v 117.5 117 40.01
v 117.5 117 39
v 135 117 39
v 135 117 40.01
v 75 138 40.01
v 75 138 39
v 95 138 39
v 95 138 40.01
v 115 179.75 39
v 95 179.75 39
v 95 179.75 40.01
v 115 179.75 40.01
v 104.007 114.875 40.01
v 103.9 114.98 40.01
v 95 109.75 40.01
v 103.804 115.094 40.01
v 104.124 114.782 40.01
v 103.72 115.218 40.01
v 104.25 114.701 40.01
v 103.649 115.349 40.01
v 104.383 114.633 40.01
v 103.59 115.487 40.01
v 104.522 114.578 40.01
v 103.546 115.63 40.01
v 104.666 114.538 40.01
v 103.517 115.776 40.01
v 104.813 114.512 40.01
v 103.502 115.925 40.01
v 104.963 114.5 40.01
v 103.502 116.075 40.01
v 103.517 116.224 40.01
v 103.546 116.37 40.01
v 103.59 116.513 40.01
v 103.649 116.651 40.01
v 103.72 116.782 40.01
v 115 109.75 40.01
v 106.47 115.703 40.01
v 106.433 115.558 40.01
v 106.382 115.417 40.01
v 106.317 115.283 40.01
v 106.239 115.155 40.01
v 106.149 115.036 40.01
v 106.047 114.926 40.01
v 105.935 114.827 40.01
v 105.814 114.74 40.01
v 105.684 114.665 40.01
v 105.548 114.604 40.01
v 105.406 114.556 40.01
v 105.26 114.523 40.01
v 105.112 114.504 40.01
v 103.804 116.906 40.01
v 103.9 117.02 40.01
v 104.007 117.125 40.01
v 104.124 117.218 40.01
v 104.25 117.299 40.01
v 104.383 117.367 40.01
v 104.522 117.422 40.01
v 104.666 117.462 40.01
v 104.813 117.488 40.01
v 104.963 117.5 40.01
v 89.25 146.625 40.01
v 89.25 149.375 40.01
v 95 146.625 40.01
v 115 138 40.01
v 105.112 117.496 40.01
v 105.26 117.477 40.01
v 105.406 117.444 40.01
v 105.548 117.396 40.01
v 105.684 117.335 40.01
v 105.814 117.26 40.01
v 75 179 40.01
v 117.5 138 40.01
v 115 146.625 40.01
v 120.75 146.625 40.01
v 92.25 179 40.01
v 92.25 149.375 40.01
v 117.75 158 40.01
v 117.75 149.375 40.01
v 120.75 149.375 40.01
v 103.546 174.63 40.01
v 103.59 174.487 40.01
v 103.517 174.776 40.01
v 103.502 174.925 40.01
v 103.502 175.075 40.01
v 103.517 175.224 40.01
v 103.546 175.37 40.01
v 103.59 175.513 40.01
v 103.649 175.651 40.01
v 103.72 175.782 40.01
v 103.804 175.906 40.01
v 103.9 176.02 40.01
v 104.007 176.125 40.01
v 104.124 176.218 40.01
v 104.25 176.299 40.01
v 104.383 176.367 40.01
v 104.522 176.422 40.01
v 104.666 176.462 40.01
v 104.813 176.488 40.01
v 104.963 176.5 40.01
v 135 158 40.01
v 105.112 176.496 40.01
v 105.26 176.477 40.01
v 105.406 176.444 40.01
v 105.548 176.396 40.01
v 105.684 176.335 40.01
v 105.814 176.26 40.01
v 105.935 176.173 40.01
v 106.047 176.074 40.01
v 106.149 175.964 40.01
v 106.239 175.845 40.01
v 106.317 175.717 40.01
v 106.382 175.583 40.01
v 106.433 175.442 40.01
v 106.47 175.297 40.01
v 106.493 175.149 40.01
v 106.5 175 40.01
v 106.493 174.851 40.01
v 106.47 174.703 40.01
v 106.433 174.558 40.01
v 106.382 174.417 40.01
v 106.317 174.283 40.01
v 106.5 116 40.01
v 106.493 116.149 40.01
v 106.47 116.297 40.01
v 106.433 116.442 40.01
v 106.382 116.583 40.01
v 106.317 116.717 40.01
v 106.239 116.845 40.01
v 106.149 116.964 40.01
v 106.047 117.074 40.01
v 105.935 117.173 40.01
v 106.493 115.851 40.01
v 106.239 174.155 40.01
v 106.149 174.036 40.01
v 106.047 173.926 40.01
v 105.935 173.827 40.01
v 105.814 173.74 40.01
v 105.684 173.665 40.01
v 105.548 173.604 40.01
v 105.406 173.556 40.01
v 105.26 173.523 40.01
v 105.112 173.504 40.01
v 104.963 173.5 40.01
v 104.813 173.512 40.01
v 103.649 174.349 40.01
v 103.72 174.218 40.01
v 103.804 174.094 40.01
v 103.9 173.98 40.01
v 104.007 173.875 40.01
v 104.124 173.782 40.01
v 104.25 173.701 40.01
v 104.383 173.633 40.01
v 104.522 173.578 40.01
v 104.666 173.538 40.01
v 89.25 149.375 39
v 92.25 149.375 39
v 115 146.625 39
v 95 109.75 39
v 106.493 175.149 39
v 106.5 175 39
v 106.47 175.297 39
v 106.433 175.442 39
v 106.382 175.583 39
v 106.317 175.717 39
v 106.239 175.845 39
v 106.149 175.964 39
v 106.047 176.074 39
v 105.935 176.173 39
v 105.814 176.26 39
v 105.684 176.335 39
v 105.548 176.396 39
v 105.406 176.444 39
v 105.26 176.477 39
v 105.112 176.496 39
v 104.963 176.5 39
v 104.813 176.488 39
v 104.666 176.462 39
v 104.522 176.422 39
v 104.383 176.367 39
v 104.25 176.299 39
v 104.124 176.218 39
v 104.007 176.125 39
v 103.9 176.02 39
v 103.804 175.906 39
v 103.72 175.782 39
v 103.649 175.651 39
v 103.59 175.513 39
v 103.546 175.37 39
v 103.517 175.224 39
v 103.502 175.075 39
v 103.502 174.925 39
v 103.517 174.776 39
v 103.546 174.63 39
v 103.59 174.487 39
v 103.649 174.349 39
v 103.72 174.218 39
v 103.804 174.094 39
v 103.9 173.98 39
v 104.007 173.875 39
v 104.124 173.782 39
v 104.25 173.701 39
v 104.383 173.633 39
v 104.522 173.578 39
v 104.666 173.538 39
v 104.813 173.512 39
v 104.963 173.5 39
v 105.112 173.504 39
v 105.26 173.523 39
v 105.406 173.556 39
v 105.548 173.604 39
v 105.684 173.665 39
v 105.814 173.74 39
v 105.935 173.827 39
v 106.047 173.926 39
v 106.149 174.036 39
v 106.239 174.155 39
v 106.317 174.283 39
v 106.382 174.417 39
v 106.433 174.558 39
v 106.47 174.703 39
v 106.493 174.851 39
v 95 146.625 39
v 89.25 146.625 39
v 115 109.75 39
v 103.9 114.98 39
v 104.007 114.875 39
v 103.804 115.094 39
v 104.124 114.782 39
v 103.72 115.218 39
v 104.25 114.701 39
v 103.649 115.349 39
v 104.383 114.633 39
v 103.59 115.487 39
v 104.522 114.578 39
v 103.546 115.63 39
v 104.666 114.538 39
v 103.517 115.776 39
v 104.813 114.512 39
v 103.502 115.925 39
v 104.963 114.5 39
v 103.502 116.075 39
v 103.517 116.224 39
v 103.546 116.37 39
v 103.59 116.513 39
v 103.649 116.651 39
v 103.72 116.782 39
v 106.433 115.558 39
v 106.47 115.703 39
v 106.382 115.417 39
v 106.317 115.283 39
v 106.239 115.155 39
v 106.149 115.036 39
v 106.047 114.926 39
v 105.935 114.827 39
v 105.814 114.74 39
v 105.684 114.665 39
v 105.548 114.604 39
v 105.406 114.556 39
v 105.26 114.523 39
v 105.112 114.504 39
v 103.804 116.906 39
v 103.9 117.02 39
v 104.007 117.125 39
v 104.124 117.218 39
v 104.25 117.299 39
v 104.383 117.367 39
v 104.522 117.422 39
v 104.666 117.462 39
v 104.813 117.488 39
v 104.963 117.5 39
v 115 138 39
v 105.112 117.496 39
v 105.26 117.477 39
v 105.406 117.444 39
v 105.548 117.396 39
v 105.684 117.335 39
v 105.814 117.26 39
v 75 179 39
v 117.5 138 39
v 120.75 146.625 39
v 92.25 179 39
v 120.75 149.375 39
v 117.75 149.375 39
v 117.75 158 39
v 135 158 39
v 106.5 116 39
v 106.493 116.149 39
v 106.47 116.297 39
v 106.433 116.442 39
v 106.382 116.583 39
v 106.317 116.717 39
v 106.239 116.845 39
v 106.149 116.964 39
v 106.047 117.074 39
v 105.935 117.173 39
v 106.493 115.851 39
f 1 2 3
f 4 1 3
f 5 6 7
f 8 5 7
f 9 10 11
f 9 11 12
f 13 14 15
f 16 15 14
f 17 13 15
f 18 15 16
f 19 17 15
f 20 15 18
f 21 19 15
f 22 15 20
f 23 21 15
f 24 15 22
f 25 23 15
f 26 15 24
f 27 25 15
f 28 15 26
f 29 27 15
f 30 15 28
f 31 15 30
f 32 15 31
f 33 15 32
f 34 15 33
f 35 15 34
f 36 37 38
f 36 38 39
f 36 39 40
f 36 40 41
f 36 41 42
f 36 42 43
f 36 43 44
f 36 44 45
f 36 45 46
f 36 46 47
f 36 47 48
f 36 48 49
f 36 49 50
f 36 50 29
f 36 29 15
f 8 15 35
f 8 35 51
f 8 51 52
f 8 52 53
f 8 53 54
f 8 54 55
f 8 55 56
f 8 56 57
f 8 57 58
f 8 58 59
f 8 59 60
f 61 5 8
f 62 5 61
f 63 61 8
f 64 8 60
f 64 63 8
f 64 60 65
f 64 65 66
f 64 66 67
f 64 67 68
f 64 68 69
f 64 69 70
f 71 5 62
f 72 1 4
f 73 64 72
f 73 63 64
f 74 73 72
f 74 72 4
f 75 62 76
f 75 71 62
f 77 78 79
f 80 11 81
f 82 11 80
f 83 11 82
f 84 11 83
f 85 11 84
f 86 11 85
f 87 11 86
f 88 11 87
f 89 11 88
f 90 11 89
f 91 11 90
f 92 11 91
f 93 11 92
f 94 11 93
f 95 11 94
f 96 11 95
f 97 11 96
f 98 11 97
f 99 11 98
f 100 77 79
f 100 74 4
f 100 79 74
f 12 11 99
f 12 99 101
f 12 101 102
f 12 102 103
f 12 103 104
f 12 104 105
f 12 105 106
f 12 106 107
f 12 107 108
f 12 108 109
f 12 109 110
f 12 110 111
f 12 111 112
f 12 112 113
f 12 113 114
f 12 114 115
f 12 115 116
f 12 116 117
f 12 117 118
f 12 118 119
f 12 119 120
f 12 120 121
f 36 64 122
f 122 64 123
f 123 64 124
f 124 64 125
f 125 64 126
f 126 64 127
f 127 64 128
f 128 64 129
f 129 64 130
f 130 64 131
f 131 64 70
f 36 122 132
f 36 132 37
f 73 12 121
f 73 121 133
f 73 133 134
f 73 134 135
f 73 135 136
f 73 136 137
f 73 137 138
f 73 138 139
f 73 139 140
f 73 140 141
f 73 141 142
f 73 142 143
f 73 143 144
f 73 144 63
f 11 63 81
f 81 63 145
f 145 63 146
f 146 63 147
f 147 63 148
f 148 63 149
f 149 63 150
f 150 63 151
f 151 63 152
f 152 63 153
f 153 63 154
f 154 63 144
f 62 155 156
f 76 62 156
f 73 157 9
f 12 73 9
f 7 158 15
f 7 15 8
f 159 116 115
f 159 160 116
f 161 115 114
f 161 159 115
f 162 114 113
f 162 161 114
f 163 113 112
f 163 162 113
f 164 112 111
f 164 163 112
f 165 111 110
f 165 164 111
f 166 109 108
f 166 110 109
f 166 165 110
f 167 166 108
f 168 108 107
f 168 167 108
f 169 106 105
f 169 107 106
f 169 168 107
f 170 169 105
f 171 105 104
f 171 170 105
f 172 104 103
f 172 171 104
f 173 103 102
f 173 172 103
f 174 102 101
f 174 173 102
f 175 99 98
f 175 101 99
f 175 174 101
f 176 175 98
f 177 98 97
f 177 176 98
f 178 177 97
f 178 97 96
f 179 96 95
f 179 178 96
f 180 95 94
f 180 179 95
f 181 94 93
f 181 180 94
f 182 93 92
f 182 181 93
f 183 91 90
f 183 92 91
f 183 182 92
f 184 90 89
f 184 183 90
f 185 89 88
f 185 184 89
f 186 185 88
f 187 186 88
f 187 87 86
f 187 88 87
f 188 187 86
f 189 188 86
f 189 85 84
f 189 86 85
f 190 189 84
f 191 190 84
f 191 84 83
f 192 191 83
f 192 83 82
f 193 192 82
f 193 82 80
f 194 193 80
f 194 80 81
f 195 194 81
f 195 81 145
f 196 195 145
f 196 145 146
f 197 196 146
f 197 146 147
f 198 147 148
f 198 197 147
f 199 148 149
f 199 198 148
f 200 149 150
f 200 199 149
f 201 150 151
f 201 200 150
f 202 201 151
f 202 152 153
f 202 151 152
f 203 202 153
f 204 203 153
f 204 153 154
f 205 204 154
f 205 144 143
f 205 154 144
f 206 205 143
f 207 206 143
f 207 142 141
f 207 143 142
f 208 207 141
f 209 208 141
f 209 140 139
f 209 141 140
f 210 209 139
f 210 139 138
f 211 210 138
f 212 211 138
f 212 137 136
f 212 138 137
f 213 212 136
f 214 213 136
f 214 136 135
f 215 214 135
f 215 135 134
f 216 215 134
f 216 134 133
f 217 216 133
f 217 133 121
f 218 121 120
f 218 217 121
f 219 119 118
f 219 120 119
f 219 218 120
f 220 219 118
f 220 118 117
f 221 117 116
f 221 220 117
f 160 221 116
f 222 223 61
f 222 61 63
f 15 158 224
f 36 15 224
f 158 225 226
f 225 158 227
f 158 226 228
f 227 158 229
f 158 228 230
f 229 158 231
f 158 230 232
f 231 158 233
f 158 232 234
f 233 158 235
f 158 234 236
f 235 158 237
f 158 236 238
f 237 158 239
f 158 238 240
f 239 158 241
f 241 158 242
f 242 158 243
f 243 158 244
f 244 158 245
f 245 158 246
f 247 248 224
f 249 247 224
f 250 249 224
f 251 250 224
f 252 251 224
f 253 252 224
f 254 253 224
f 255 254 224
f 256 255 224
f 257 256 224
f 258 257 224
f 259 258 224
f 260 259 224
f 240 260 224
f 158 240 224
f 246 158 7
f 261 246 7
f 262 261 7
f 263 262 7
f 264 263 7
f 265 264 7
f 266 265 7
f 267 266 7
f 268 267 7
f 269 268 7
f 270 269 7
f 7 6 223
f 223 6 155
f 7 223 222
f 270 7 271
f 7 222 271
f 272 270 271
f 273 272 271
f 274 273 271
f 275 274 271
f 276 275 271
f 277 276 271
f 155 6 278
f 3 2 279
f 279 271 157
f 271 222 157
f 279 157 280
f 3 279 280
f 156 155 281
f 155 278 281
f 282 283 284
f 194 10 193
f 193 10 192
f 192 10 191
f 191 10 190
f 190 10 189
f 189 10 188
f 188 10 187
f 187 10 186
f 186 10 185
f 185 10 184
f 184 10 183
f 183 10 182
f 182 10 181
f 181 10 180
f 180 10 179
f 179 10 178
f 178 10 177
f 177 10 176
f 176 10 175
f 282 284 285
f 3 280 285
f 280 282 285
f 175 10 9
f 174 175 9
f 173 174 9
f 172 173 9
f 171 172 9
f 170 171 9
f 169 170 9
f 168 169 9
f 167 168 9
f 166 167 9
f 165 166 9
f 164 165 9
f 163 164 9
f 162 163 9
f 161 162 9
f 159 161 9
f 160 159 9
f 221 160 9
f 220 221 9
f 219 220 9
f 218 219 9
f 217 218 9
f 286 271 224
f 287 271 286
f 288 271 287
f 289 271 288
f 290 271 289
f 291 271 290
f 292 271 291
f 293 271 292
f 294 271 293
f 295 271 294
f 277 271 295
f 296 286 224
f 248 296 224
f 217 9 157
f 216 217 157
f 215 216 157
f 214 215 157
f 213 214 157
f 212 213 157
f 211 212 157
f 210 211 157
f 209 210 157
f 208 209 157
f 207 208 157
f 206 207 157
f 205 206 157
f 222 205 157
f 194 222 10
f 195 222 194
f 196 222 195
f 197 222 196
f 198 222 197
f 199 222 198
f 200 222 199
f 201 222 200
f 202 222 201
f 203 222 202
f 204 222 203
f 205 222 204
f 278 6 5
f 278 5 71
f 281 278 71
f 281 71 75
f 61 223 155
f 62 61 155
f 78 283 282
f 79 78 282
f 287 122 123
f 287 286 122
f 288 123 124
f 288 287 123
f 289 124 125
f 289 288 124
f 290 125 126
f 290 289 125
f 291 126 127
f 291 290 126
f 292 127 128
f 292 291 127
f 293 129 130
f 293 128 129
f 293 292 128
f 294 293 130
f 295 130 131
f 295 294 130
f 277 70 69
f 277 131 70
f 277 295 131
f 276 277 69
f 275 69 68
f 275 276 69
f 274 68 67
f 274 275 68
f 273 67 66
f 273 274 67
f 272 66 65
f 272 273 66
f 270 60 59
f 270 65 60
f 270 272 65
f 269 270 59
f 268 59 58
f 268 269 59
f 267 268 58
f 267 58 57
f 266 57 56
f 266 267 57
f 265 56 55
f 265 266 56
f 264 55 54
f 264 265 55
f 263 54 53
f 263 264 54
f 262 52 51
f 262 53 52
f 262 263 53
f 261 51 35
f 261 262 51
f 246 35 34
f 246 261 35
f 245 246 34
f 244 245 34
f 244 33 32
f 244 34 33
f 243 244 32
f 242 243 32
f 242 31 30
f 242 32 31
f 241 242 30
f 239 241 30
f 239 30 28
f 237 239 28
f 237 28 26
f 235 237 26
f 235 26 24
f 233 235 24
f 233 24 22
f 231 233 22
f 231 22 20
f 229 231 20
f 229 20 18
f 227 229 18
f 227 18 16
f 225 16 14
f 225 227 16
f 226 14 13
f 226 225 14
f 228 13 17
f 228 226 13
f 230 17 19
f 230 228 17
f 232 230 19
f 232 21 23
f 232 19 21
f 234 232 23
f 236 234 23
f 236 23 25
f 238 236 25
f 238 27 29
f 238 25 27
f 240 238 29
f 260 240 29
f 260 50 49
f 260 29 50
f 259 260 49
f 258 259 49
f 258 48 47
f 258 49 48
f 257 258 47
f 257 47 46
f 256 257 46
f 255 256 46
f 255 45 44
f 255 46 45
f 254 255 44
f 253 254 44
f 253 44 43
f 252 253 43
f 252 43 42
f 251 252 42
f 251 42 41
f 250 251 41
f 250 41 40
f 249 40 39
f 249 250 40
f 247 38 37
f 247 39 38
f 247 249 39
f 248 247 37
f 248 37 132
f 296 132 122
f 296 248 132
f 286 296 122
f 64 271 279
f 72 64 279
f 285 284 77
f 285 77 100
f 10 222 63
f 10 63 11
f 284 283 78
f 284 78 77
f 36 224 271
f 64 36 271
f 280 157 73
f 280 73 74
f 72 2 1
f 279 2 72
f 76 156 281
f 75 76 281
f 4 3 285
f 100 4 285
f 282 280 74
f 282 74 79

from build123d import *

# Parameters (mm, degrees)
CYLINDER078_R     = 1.5
CYLINDER078_DEPTH = 10
BOX015_W          = 5.75
BOX015_H          = 2.75
BOX015_DEPTH      = 10
BOX014_W          = 2.75
BOX014_H          = 34
BOX014_DEPTH      = 10
BOX013_W          = 5.75
BOX013_H          = 2.75
BOX013_DEPTH      = 10
BOX012_W          = 2.75
BOX012_H          = 34
BOX012_DEPTH      = 10
CYLINDER077_R     = 1.5
CYLINDER077_DEPTH = 10
BOX011_W          = 17.5
BOX011_H          = 21
BOX011_DEPTH      = 1.01
BOX009_W          = 20
BOX009_H          = 20
BOX009_DEPTH      = 1.01
BOX008_W          = 20
BOX008_H          = 20
BOX008_DEPTH      = 1.01
BOX007_W          = 20
BOX007_H          = 70
BOX007_DEPTH      = 1.01
BOX010_W          = 17.5
BOX010_H          = 21
BOX010_DEPTH      = 1.01


with BuildPart() as shieldcrosshole1:
    # Cylinder078 → Cylinder078 (new body)
    with BuildSketch(Plane(origin=(105, 116, 34), x_dir=(1, 0, 0), z_dir=(0, 0, 1))):
        Circle(CYLINDER078_R)
    extrude(amount=CYLINDER078_DEPTH)


with BuildPart() as cube007:
    # Box015 → Box015 (new body)
    with BuildSketch(Plane(origin=(115, 146.625, 34), x_dir=(1, 0, 0), z_dir=(0, 0, 1))):
        with Locations((2.875, 1.375)):
            Rectangle(BOX015_W, BOX015_H)
    extrude(amount=BOX015_DEPTH)


with BuildPart() as cube006:
    # Box014 → Box014 (new body)
    with BuildSketch(Plane(origin=(115, 146.75, 34), x_dir=(1, 0, 0), z_dir=(0, 0, 1))):
        with Locations((1.375, 17)):
            Rectangle(BOX014_W, BOX014_H)
    extrude(amount=BOX014_DEPTH)


with BuildPart() as cube005:
    # Box013 → Box013 (new body)
    with BuildSketch(Plane(origin=(89.25, 146.625, 34), x_dir=(1, 0, 0), z_dir=(0, 0, 1))):
        with Locations((2.875, 1.375)):
            Rectangle(BOX013_W, BOX013_H)
    extrude(amount=BOX013_DEPTH)


with BuildPart() as cube004:
    # Box012 → Box012 (new body)
    with BuildSketch(Plane(origin=(92.25, 146.75, 34), x_dir=(1, 0, 0), z_dir=(0, 0, 1))):
        with Locations((1.375, 17)):
            Rectangle(BOX012_W, BOX012_H)
    extrude(amount=BOX012_DEPTH)


with BuildPart() as shieldcuts:
    # Cylinder077 → Cylinder077 (new body)
    with BuildSketch(Plane(origin=(105, 175, 34), x_dir=(1, 0, 0), z_dir=(0, 0, 1))):
        Circle(CYLINDER077_R)
    extrude(amount=CYLINDER077_DEPTH)

    # Fusion037: union ShieldCrossHole1, Cube007, Cube006, Cube005, Cube004
    add(shieldcrosshole1.part)
    add(cube007.part)
    add(cube006.part)
    add(cube005.part)
    add(cube004.part)


with BuildPart() as shieldcross007:
    # Box011 → Box011 (new body)
    with BuildSketch(Plane(origin=(117.5, 117, 39), x_dir=(1, 0, 0), z_dir=(0, 0, 1))):
        with Locations((8.75, 10.5)):
            Rectangle(BOX011_W, BOX011_H)
    extrude(amount=BOX011_DEPTH)


with BuildPart() as shieldcross005:
    # Box009 → Box009 (new body)
    with BuildSketch(Plane(origin=(75, 138, 39), x_dir=(1, 0, 0), z_dir=(0, 0, 1))):
        with Locations((10, 10)):
            Rectangle(BOX009_W, BOX009_H)
    extrude(amount=BOX009_DEPTH)


with BuildPart() as shieldcross004:
    # Box008 → Box008 (new body)
    with BuildSketch(Plane(origin=(115, 138, 39), x_dir=(1, 0, 0), z_dir=(0, 0, 1))):
        with Locations((10, 10)):
            Rectangle(BOX008_W, BOX008_H)
    extrude(amount=BOX008_DEPTH)


with BuildPart() as shieldcross003:
    # Box007 → Box007 (new body)
    with BuildSketch(Plane(origin=(95, 109.75, 39), x_dir=(1, 0, 0), z_dir=(0, 0, 1))):
        with Locations((10, 35)):
            Rectangle(BOX007_W, BOX007_H)
    extrude(amount=BOX007_DEPTH)


with BuildPart() as shieldfold:
    # Box010 → Box010 (new body)
    with BuildSketch(Plane(origin=(75, 158, 39), x_dir=(1, 0, 0), z_dir=(0, 0, 1))):
        with Locations((8.75, 10.5)):
            Rectangle(BOX010_W, BOX010_H)
    extrude(amount=BOX010_DEPTH)

    # Fusion036: union ShieldCross007, ShieldCross005, ShieldCross004, ShieldCross003
    add(shieldcross007.part)
    add(shieldcross005.part)
    add(shieldcross004.part)
    add(shieldcross003.part)

    # Cut009: cut ShieldCuts
    add(shieldcuts.part, mode=Mode.SUBTRACT)


solid = shieldfold.part
